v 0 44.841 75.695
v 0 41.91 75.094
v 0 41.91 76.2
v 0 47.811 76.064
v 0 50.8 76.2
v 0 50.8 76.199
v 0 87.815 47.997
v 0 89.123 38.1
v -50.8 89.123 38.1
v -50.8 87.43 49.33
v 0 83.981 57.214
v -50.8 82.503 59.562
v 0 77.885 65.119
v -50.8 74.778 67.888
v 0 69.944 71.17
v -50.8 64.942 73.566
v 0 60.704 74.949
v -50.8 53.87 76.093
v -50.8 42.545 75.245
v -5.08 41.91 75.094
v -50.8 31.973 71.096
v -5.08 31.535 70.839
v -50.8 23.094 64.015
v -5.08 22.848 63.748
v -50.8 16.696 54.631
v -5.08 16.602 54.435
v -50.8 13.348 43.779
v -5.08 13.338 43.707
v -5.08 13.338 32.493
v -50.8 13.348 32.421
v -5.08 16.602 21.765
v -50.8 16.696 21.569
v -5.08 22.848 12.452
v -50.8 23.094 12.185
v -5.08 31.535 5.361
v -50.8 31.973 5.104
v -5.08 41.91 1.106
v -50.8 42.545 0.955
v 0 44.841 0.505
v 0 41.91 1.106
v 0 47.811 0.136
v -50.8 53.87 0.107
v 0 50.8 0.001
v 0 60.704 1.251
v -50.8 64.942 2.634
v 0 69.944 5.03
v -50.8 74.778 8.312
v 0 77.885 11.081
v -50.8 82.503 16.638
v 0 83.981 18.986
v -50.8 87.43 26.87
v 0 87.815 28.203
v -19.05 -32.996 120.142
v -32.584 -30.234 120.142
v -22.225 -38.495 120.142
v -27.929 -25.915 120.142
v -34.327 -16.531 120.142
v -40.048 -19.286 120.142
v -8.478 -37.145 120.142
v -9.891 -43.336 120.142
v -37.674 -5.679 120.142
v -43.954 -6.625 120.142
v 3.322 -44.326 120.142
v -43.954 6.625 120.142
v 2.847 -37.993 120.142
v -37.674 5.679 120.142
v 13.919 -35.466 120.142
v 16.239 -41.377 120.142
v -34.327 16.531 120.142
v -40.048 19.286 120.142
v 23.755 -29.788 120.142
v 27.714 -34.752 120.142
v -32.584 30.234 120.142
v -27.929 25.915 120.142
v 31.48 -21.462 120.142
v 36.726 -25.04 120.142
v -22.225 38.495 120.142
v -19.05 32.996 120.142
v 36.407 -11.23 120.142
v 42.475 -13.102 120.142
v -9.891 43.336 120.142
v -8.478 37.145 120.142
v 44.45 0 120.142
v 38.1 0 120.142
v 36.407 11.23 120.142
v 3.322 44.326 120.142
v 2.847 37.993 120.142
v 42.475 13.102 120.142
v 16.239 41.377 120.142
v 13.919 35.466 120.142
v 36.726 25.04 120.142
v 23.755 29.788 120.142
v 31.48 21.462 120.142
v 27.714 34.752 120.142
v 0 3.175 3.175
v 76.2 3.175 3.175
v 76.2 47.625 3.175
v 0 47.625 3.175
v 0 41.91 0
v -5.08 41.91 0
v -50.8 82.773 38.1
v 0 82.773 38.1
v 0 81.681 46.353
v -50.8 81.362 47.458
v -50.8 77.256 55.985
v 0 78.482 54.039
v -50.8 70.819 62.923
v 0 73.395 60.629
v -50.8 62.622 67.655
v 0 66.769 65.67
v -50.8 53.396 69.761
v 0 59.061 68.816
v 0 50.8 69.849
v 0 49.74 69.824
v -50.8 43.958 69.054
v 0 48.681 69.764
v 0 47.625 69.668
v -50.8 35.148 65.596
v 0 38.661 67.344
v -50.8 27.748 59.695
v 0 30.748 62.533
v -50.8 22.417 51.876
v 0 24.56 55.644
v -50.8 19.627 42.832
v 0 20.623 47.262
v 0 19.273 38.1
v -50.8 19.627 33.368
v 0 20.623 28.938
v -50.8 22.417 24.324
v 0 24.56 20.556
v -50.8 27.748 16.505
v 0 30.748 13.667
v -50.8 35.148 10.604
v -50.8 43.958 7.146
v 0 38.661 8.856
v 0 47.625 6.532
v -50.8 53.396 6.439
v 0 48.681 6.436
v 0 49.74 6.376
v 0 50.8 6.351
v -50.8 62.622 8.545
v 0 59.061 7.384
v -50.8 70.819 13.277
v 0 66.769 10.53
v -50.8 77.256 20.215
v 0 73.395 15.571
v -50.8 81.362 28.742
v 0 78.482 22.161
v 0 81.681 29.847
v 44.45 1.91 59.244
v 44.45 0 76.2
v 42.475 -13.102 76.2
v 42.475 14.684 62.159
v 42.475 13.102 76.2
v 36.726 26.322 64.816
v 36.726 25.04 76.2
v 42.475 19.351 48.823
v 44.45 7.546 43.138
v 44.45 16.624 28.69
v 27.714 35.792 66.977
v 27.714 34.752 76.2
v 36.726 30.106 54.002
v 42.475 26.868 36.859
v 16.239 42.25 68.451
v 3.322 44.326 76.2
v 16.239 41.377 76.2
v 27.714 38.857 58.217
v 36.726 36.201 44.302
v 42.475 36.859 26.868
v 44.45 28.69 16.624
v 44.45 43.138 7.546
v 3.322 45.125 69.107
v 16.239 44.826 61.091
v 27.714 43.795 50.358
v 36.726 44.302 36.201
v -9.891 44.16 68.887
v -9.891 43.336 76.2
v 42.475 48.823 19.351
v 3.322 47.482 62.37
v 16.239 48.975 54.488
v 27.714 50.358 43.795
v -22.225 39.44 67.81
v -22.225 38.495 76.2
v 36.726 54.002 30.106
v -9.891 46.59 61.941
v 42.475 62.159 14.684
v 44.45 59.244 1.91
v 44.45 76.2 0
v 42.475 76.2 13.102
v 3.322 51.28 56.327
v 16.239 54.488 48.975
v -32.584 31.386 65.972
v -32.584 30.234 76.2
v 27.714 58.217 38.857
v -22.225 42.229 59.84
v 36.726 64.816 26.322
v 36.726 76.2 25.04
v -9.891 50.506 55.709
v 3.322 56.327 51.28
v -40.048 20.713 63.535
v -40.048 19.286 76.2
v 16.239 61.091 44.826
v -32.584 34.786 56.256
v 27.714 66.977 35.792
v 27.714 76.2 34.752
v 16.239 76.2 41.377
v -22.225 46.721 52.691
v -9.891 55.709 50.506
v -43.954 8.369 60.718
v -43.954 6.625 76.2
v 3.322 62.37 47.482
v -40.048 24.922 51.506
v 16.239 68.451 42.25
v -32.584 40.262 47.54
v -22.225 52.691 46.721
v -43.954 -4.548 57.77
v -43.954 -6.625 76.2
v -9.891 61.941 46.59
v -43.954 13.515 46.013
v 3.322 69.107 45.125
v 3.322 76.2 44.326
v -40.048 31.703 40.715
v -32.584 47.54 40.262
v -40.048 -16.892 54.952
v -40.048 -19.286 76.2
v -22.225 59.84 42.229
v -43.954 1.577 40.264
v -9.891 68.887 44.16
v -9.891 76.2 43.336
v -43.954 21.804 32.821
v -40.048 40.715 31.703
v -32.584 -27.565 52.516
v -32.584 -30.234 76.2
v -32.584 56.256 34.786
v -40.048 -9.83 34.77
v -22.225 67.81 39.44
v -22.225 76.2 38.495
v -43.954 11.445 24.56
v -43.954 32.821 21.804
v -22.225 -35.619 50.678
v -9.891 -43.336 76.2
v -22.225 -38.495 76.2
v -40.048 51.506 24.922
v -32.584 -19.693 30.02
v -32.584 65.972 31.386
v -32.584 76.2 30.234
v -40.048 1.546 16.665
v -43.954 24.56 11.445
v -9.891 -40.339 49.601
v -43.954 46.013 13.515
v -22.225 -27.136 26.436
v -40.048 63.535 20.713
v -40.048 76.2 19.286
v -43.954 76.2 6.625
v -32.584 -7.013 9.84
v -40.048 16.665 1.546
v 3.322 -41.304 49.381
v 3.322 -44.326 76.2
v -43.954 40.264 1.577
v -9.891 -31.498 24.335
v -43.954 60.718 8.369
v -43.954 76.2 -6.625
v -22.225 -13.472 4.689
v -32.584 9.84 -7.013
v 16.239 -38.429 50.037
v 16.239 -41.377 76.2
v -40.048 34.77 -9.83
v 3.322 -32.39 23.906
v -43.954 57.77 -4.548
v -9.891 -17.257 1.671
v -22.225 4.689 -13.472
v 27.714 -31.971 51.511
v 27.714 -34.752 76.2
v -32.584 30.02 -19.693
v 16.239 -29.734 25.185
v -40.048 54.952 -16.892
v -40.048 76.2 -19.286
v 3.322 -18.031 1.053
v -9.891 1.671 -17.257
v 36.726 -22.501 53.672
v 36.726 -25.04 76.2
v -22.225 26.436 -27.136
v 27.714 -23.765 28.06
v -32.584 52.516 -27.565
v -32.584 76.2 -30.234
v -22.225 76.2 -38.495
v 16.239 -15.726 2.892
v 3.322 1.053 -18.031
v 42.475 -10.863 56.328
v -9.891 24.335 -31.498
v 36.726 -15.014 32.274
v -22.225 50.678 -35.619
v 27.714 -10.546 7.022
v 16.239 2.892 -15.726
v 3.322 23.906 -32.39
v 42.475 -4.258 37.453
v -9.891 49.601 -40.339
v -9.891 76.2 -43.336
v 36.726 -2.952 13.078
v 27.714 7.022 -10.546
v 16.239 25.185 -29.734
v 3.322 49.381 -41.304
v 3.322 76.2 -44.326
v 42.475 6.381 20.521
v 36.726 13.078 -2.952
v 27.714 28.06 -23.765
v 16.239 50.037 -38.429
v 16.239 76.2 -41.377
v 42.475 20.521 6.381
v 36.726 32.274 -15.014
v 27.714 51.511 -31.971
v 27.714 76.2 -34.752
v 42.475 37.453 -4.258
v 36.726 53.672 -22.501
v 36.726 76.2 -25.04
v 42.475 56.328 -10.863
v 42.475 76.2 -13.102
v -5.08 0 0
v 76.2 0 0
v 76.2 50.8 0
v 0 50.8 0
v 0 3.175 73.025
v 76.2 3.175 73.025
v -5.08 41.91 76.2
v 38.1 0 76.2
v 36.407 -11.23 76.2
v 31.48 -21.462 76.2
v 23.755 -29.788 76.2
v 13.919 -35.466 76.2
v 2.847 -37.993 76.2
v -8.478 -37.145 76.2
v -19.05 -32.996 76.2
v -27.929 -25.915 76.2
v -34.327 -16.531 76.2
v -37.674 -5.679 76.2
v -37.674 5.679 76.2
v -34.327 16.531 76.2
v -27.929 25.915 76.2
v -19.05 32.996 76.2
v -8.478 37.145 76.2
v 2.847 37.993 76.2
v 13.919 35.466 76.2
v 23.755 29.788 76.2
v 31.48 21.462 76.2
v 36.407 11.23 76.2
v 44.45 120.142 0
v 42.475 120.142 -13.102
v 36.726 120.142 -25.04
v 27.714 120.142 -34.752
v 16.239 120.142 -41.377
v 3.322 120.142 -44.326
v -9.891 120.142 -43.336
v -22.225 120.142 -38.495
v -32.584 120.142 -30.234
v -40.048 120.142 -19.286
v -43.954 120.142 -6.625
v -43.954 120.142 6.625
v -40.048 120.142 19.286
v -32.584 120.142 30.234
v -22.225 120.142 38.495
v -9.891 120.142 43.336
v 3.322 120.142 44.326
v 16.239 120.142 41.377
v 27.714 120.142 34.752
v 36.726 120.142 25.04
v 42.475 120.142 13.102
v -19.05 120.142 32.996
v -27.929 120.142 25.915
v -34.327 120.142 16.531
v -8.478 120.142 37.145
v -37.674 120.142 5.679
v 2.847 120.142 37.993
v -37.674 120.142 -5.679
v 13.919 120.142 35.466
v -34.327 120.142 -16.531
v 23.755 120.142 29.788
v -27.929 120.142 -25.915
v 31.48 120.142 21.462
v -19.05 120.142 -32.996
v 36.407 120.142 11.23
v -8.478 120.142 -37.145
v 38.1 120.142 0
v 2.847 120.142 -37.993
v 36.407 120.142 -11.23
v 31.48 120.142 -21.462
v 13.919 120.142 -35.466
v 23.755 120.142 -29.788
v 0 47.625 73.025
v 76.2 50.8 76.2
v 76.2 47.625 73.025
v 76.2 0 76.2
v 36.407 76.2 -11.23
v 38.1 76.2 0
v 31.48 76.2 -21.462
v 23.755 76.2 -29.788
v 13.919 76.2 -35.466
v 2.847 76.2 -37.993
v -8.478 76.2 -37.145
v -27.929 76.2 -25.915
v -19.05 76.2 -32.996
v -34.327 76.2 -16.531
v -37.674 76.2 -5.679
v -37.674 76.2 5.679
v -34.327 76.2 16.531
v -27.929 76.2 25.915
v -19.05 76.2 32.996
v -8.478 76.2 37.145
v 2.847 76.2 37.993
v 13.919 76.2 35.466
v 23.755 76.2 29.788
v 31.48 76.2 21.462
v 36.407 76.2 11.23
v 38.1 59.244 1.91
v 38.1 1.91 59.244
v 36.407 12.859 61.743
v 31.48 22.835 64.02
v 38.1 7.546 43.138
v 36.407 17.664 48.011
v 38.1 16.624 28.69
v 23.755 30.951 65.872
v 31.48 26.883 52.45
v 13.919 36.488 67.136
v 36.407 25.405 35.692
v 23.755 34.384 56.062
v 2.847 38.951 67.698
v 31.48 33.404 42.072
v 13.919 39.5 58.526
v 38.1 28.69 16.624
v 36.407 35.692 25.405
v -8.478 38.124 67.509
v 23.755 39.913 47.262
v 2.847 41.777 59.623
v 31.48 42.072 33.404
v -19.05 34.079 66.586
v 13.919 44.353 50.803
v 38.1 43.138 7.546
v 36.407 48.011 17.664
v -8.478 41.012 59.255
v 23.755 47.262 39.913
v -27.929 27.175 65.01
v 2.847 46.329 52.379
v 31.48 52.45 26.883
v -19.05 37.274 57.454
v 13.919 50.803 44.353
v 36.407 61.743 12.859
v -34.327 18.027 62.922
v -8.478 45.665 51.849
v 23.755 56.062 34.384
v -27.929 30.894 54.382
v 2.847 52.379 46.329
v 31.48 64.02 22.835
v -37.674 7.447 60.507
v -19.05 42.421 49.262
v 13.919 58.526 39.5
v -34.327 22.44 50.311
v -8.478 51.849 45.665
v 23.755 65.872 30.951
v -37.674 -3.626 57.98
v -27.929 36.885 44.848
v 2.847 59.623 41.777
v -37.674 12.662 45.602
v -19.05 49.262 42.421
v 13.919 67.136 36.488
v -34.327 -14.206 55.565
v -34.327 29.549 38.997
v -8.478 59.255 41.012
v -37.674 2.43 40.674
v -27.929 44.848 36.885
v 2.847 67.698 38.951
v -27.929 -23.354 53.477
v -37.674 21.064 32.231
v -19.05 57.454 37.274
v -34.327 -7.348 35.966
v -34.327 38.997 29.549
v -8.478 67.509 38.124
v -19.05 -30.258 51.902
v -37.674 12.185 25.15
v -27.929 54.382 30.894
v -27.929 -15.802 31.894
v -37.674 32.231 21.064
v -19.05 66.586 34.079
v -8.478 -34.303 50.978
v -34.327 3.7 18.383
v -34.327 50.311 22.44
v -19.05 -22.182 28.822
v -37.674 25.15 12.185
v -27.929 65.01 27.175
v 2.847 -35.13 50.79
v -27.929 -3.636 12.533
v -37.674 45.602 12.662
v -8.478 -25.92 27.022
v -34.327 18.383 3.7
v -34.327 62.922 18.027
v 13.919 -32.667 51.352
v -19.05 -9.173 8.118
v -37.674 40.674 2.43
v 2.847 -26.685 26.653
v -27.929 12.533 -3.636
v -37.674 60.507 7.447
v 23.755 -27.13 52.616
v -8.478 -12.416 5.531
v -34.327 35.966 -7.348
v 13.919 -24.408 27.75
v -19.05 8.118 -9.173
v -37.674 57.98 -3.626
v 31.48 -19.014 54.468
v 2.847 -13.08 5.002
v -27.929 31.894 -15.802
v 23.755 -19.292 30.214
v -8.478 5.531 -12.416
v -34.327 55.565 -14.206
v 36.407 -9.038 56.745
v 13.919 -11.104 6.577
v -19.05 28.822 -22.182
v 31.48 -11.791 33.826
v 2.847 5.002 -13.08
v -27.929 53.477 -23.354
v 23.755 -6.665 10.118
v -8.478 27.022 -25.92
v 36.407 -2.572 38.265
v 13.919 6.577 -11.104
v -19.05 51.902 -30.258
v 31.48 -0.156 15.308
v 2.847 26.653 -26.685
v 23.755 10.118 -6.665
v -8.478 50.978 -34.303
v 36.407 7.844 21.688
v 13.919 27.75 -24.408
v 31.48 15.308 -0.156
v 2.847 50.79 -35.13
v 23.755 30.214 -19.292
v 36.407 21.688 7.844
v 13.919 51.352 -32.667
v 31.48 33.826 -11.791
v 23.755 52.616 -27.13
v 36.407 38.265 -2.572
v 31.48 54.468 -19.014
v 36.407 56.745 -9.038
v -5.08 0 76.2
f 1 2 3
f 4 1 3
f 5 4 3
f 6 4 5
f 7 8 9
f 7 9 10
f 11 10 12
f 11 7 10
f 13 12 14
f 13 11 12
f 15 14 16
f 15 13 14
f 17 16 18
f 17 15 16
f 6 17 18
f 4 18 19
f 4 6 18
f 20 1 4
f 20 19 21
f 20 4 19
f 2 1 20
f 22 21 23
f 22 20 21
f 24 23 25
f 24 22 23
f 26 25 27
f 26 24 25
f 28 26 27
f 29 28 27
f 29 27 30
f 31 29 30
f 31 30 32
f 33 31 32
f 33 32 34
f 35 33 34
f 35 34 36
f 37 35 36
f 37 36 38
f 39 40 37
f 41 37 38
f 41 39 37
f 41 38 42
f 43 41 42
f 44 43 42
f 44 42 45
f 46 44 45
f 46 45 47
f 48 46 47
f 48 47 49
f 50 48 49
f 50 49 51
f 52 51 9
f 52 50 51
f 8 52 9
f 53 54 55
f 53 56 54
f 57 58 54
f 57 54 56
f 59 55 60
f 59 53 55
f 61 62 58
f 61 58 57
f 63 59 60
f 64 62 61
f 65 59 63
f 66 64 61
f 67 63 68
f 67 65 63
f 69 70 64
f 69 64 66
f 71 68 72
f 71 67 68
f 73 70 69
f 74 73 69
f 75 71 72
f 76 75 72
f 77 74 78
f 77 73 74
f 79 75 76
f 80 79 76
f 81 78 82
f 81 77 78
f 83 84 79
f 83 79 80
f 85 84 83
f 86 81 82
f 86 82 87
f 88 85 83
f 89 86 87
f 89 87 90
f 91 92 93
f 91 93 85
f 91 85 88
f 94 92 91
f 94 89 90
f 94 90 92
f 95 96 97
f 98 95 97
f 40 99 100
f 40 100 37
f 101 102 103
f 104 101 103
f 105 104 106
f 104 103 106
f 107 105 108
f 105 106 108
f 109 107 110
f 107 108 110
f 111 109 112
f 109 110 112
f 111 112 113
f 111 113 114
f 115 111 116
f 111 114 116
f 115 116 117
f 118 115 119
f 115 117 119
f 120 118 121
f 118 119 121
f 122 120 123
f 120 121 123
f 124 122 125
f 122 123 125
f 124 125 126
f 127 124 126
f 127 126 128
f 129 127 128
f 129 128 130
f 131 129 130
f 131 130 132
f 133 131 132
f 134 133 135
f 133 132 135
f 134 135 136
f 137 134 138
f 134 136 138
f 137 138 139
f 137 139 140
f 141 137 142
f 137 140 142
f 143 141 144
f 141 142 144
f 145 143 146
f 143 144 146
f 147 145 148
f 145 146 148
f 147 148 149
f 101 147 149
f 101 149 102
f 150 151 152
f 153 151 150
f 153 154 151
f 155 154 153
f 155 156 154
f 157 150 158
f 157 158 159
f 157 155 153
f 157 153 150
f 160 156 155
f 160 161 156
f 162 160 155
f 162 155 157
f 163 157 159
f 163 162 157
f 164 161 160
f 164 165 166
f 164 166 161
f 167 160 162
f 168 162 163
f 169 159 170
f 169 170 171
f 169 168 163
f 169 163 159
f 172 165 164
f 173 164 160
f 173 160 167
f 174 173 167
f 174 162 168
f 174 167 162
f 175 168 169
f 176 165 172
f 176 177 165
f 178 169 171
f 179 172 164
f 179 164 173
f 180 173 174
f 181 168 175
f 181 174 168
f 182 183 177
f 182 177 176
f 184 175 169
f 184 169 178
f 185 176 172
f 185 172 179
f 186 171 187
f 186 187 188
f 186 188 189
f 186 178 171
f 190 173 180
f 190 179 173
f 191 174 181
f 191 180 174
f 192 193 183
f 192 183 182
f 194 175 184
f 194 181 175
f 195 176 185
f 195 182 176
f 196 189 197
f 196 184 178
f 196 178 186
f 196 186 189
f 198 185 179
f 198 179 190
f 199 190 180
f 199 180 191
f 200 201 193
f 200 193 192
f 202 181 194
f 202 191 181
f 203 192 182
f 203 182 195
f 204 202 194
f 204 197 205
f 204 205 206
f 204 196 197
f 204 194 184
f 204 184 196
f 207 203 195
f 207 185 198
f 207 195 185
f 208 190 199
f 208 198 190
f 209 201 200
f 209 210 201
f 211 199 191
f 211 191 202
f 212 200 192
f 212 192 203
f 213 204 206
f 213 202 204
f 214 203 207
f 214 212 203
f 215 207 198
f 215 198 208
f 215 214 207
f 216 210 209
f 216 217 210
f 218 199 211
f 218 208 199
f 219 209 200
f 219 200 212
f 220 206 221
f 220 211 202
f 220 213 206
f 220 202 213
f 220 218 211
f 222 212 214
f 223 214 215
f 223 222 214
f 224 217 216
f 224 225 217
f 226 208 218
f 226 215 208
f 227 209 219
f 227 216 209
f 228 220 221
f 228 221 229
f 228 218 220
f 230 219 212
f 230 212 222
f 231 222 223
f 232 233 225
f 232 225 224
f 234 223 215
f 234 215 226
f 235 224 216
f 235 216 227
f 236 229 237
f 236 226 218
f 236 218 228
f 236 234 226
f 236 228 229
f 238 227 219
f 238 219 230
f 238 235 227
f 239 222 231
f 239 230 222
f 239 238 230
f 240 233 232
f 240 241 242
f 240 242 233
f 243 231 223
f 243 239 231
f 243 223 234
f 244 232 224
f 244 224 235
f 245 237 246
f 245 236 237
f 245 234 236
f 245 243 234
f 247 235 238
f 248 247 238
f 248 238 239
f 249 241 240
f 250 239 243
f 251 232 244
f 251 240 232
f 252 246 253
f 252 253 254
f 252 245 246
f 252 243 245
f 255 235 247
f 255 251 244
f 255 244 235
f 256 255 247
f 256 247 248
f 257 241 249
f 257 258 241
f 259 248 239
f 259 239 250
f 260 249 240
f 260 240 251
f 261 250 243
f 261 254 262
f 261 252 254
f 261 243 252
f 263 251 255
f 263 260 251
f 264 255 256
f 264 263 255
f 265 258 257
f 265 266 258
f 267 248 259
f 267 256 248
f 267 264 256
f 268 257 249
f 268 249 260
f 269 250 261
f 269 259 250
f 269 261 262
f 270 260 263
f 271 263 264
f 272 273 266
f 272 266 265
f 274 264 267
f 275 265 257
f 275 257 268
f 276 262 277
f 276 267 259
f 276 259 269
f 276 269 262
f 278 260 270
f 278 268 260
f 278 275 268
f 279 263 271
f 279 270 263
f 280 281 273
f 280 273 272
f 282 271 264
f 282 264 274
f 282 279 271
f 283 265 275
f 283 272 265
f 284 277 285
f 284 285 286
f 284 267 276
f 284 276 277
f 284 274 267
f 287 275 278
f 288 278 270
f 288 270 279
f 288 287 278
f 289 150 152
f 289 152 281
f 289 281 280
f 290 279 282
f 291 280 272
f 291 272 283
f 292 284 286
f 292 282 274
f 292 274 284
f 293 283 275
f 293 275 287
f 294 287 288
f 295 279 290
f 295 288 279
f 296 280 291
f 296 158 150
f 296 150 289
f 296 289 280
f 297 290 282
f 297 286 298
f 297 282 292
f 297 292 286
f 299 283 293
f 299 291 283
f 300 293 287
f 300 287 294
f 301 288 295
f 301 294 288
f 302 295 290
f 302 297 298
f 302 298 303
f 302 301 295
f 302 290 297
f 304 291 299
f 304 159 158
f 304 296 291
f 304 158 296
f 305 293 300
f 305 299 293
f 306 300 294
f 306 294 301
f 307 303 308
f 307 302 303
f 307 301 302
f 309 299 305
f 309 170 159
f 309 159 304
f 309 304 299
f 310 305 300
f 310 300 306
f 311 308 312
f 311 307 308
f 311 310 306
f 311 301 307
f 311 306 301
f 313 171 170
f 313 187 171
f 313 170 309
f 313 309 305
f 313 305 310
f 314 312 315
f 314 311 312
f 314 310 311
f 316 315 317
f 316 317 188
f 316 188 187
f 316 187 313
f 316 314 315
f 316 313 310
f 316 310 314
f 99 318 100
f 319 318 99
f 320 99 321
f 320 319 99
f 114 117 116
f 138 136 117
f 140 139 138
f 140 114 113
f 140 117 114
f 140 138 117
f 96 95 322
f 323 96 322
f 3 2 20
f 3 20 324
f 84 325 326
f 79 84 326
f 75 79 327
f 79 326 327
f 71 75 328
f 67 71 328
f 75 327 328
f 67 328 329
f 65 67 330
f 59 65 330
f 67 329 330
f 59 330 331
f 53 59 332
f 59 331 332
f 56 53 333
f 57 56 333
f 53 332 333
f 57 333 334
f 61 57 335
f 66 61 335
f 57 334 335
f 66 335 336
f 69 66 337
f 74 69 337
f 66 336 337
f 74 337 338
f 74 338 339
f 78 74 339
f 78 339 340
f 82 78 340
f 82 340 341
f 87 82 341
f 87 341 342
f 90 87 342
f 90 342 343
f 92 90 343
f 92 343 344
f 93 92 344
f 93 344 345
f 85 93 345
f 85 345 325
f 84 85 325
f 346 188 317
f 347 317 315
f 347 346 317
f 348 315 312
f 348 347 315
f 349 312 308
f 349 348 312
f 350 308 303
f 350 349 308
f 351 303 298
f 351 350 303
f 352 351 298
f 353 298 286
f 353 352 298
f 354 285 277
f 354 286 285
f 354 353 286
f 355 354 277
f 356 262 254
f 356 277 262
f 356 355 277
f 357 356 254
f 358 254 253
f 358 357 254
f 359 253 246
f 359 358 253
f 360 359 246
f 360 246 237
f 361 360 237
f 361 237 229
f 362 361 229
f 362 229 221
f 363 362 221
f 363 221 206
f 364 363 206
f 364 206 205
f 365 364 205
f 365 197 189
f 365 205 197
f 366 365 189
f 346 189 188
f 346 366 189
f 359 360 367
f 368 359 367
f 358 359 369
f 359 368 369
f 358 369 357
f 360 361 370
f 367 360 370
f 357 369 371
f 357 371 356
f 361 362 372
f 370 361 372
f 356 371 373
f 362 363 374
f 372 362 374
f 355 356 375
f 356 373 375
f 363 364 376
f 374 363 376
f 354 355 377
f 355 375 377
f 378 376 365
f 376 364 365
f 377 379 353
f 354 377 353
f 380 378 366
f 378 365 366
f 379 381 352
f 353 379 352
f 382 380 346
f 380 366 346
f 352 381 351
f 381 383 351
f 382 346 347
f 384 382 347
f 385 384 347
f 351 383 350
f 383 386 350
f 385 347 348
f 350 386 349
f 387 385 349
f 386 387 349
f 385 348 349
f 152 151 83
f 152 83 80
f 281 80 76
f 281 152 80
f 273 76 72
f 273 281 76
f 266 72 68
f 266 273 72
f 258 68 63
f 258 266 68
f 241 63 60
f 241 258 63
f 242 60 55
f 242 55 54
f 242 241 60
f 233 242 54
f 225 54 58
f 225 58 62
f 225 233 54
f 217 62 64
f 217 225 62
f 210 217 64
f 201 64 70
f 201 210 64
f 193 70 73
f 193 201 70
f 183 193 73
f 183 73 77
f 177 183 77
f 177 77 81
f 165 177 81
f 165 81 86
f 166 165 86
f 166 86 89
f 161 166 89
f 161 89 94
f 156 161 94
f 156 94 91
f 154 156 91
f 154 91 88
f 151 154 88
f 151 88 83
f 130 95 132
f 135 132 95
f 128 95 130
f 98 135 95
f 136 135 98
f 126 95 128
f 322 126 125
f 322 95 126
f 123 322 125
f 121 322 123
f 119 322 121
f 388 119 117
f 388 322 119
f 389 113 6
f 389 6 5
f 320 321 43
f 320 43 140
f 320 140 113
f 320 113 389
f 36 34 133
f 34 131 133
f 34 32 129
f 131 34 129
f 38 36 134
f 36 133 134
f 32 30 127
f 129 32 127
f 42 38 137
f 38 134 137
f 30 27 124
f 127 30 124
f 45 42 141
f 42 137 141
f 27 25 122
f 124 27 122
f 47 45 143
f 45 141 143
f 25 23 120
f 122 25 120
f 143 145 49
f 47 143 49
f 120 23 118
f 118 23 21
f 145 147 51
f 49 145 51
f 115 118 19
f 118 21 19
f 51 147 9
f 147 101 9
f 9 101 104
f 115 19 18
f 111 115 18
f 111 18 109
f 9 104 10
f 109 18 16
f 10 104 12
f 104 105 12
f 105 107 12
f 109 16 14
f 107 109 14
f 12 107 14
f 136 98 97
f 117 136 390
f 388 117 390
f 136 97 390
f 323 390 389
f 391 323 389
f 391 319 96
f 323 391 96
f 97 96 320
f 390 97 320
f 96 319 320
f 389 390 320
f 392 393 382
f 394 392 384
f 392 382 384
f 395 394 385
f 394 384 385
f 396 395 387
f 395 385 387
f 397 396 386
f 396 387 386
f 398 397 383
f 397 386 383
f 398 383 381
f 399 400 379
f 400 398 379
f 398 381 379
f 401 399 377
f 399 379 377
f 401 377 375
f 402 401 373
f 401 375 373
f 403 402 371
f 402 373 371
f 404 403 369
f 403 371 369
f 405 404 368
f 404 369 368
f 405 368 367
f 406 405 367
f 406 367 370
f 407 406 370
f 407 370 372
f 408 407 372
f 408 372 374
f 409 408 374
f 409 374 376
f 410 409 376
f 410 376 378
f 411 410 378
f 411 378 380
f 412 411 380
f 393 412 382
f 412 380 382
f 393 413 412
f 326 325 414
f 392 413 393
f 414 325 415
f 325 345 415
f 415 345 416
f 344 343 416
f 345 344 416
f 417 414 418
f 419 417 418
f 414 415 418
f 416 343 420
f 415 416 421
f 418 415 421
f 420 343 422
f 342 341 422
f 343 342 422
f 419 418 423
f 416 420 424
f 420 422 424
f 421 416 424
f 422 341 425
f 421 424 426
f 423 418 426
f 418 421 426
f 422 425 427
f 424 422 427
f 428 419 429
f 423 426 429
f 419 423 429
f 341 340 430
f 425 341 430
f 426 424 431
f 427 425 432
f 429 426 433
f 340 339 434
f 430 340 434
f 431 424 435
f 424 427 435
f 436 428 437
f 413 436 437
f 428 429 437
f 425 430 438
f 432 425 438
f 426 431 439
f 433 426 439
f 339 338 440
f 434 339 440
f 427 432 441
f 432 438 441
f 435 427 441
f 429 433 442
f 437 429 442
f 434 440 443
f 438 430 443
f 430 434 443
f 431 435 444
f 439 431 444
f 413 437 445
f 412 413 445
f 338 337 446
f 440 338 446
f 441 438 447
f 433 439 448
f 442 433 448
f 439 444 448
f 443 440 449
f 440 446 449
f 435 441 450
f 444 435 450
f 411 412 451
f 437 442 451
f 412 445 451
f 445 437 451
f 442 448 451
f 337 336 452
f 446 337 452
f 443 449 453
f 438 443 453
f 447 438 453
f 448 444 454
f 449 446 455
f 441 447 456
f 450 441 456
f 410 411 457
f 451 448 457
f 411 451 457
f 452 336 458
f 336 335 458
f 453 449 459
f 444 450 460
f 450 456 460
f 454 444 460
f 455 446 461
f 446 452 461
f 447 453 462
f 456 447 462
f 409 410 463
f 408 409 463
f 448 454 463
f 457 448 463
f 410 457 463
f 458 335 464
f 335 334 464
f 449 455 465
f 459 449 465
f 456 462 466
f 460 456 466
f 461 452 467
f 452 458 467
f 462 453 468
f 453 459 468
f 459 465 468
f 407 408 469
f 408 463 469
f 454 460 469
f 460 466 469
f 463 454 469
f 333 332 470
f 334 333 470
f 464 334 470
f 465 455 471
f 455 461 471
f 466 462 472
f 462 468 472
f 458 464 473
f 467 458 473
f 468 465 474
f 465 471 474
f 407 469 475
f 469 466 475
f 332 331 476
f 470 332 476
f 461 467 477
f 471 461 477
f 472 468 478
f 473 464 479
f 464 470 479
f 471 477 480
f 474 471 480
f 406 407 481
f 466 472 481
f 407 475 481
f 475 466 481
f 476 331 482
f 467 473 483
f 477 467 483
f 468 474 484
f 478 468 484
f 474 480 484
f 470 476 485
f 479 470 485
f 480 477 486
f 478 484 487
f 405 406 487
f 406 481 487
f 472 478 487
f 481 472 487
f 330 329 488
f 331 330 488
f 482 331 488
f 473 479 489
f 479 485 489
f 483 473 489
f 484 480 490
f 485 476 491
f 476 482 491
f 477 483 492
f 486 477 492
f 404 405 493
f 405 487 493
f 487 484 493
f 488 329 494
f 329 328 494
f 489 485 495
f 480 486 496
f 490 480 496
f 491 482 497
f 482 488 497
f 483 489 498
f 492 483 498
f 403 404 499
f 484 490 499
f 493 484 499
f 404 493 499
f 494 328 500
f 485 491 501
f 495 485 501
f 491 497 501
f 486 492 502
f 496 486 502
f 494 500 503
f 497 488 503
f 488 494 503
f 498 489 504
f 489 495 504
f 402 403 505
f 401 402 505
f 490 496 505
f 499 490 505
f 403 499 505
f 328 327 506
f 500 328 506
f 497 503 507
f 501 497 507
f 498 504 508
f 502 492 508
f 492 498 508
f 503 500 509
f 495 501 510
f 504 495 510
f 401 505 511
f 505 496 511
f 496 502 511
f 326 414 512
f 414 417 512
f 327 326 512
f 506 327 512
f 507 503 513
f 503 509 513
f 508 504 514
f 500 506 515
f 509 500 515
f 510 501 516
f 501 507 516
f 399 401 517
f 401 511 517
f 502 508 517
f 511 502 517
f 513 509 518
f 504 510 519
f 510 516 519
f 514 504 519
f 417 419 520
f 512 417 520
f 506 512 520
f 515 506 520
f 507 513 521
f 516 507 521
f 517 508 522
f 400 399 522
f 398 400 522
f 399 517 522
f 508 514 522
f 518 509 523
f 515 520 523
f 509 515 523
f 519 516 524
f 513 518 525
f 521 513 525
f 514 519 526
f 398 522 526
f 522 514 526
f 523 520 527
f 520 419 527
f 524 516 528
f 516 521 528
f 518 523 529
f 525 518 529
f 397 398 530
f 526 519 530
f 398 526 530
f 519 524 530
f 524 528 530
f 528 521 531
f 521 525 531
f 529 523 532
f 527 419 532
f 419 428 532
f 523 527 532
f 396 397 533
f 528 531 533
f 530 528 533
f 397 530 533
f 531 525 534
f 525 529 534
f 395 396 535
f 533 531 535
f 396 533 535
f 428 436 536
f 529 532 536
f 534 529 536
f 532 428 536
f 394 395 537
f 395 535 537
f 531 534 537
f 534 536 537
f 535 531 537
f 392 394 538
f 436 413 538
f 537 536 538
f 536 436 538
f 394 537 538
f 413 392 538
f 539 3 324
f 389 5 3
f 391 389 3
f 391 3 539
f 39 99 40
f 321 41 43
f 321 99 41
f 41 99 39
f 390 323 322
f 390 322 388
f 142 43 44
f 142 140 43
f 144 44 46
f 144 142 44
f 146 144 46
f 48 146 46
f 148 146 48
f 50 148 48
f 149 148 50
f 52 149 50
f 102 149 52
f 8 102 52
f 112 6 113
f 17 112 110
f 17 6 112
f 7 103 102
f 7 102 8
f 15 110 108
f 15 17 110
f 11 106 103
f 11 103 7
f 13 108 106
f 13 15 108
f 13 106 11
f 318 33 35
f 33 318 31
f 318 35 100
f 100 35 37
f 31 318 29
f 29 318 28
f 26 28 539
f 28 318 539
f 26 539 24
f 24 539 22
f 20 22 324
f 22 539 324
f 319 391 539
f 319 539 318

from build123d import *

# Parameters (mm, degrees)
F0_W     = 76.2
F0_H     = 50.8
F1_DEPTH = 76.2
F2_W     = 44.45
F2_H     = 69.85
F3_DEPTH = 76.2
F4_R     = 38.1
F4_R_2   = 31.75
F5_DEPTH = 50.8
F7_DEPTH = 5.08
F10_R    = 44.45
F10_R_2  = 38.1


with BuildPart() as f1:
    # F0 (on Top) → F1 (new body)
    with BuildSketch(Plane.XY):
        with Locations((38.1, 25.4)):
            Rectangle(F0_W, F0_H)
    extrude(amount=F1_DEPTH)

    # F2 (on face) → F3 (cut, through all)
    with BuildSketch(Plane.YZ.offset(76.2)):
        with Locations((25.4, 38.1)):
            Rectangle(F2_W, F2_H)
    extrude(amount=-F3_DEPTH, mode=Mode.SUBTRACT)

    # F4 (on Right) → F5 (join)
    with BuildSketch(Plane.YZ):
        with Locations((51.022876054, 38.1)):
            Circle(F4_R)
        with Locations((51.022876054, 38.1)):
            Circle(F4_R_2, mode=Mode.SUBTRACT)
    extrude(amount=-F5_DEPTH)

    # F6 (on Right) → F7 (join)
    with BuildSketch(Plane.YZ):
        with BuildLine():
            ThreePointArc((41.91, 1.1058722224), (12.922876054, 38.1), (41.91, 75.0941277776))
            Line((41.91, 75.0941277776), (41.91, 76.2))
            Line((41.91, 76.2), (0, 76.2))
            Line((0, 76.2), (0, 0))
            Line((0, 0), (41.91, 0))
            Line((41.91, 0), (41.91, 1.1058722224))
        make_face()
    extrude(amount=-F7_DEPTH)


with BuildPart() as f11:
    # F11: sweep along a path in F8
    with BuildLine(Plane.YZ) as f11_path:
        Line((0, 120.142), (0, 76.2))
        ThreePointArc((0, 76.2), (22.3184632736, 22.3184632736), (76.2, 0))
        Line((76.2, 0), (120.142, 0))
    # F10 (on plane+point) → F11 (sweep)
    with BuildSketch(Plane.XY.offset(120.142)):
        Circle(F10_R)
        Circle(F10_R_2, mode=Mode.SUBTRACT)
    sweep(path=f11_path.line)


solid = Compound([f1.part, f11.part])
